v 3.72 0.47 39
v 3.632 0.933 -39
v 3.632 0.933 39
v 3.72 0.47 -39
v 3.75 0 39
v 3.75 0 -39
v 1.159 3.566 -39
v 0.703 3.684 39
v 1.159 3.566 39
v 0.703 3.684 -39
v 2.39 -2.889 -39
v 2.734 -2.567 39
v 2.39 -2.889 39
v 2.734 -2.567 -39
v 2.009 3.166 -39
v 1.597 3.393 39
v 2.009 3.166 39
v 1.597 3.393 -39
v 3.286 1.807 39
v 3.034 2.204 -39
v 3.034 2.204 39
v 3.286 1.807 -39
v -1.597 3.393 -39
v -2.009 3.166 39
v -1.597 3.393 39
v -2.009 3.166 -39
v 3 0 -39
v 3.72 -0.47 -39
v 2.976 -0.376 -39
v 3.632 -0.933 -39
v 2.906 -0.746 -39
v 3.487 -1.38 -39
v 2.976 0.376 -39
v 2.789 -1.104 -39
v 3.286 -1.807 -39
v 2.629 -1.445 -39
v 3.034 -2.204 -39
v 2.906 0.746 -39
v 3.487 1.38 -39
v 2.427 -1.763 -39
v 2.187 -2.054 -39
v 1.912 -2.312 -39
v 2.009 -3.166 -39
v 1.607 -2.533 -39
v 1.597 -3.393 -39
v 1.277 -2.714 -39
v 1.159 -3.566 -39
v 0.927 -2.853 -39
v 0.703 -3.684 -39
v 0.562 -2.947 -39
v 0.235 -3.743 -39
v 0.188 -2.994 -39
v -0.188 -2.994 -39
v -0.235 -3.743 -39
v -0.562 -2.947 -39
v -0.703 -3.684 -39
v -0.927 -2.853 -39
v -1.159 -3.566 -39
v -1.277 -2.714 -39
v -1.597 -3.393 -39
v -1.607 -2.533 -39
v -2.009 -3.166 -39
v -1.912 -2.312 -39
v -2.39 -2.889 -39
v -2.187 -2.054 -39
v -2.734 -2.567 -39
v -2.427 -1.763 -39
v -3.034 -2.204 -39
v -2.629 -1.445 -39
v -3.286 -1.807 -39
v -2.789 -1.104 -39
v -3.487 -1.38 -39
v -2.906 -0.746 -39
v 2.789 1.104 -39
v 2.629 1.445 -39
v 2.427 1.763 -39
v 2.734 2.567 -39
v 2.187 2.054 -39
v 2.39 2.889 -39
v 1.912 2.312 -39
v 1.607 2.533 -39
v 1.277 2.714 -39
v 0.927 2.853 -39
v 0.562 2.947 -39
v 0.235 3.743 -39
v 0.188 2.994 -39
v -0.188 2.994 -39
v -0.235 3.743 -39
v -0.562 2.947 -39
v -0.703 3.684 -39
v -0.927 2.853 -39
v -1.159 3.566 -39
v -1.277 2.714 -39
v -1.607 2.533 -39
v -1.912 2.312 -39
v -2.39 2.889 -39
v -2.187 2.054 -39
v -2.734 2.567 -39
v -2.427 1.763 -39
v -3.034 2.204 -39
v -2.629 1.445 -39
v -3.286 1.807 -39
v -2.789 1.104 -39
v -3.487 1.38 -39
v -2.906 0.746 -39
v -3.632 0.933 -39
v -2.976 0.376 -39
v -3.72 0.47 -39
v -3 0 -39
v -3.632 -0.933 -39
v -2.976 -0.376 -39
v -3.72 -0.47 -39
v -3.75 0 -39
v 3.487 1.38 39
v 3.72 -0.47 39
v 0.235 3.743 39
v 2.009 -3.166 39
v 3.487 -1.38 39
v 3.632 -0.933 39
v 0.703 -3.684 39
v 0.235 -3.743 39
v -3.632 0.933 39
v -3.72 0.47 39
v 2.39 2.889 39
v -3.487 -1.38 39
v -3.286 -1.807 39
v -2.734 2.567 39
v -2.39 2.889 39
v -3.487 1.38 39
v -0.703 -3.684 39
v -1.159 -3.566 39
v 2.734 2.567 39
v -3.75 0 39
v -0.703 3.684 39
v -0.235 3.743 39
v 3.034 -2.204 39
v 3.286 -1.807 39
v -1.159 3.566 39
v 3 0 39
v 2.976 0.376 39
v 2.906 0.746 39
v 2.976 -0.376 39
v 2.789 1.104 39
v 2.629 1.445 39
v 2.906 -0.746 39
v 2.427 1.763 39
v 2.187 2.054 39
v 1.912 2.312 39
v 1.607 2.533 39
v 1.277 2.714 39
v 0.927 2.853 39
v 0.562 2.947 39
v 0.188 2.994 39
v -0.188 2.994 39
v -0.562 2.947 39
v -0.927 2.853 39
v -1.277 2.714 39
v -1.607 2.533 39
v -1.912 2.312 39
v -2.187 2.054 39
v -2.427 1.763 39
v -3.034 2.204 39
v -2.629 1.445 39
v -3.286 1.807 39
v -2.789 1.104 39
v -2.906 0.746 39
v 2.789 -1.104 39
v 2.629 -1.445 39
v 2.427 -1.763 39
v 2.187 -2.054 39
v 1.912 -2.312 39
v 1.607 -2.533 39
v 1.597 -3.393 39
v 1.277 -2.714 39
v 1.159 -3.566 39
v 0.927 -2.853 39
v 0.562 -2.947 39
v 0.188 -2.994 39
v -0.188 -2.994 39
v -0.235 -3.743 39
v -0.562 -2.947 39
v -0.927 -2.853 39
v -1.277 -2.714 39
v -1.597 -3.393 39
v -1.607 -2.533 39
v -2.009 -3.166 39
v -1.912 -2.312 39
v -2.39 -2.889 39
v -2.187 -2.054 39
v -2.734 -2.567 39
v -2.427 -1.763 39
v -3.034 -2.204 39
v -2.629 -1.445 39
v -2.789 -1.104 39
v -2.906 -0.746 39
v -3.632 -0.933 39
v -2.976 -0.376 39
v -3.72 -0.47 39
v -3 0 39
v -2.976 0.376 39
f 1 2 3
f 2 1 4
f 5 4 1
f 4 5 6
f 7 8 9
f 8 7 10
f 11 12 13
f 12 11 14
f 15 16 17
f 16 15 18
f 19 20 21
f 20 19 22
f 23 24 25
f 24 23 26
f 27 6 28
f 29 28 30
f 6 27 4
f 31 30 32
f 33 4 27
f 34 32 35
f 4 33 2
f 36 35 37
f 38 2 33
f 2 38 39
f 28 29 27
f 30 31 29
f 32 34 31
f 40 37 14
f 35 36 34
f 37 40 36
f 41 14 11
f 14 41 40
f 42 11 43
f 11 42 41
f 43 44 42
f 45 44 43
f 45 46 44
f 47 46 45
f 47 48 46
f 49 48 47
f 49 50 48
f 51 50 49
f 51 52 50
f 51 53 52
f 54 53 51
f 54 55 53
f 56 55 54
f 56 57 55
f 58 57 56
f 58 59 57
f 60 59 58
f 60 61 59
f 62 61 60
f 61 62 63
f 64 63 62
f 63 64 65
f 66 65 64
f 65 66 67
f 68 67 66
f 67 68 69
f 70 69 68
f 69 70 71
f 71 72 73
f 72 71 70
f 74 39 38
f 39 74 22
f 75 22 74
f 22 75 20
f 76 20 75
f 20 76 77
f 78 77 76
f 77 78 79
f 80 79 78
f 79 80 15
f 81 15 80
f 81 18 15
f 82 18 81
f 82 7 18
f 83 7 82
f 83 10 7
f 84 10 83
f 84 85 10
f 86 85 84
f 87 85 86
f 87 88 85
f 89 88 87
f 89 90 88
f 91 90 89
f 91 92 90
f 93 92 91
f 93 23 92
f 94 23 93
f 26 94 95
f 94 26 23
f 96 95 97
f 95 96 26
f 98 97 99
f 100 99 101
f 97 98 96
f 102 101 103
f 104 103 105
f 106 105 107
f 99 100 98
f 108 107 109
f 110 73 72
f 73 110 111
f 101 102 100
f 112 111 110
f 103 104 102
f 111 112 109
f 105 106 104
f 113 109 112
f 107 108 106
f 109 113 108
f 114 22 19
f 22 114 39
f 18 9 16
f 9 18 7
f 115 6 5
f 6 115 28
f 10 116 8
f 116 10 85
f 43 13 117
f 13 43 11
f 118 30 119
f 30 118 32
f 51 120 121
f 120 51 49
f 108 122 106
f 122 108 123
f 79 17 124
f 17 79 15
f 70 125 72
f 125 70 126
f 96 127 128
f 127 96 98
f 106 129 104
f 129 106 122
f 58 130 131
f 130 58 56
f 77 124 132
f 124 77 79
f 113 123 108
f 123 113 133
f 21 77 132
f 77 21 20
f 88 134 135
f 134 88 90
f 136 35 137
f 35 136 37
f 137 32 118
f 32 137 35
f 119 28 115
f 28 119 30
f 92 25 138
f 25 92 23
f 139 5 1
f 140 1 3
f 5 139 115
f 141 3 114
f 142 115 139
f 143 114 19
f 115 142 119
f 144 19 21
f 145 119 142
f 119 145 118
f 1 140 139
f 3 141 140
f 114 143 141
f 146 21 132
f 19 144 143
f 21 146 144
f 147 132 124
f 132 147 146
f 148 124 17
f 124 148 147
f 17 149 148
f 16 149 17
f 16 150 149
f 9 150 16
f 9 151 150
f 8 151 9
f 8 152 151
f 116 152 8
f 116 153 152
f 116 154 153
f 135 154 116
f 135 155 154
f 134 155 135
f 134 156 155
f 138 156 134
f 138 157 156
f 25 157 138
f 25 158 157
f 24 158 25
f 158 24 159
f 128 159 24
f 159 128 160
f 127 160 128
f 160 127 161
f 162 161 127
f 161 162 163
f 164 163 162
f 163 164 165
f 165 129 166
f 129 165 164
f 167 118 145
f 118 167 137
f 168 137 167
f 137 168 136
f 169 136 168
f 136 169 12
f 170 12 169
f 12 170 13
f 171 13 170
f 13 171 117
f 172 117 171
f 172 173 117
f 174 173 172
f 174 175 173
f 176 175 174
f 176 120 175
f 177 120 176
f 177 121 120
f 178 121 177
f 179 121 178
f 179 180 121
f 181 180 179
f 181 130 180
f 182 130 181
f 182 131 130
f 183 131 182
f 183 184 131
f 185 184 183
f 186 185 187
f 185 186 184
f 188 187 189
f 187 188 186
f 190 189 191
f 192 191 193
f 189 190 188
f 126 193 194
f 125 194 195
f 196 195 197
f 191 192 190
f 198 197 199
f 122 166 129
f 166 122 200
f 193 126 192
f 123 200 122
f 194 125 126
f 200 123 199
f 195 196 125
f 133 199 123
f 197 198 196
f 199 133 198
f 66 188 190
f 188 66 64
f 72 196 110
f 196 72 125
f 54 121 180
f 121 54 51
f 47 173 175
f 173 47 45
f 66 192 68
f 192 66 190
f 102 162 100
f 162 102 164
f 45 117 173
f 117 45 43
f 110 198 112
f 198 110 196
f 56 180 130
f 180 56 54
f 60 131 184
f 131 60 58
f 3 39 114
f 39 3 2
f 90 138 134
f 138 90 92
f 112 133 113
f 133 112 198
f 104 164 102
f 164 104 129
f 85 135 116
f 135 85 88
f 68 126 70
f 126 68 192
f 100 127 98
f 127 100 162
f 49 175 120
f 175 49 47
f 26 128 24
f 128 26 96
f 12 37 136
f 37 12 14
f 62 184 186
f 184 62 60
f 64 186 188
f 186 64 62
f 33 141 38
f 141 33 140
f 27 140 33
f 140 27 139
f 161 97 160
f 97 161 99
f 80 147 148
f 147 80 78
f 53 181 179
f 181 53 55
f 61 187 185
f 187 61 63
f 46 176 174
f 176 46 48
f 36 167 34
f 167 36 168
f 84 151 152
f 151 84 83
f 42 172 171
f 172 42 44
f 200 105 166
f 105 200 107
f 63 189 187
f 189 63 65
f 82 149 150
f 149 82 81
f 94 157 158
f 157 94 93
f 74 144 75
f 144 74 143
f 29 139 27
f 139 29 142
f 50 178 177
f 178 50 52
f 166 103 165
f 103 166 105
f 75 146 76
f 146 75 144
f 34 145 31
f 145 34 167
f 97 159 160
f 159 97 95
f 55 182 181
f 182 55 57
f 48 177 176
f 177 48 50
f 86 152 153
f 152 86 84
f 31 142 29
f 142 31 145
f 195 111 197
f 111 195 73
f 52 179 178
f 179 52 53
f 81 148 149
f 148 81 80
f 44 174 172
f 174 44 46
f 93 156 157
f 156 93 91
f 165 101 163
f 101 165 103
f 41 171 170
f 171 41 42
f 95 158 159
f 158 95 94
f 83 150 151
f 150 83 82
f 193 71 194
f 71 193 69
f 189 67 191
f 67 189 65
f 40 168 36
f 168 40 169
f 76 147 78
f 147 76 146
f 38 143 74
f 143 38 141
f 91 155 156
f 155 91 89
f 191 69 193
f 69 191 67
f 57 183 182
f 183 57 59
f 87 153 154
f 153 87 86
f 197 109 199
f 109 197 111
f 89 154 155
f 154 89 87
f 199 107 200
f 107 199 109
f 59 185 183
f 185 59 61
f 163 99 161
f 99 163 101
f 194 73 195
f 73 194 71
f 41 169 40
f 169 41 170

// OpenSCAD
$fn = 50;


difference() {
	union() {
		translate(v = [0, 0, -39.0000000000]) {
			cylinder(h = 78, r = 3.7500000000);
		}
	}
	union() {
		translate(v = [0, 0, -100.0000000000]) {
			cylinder(h = 200, r = 3.0000000000);
		}
	}
}
